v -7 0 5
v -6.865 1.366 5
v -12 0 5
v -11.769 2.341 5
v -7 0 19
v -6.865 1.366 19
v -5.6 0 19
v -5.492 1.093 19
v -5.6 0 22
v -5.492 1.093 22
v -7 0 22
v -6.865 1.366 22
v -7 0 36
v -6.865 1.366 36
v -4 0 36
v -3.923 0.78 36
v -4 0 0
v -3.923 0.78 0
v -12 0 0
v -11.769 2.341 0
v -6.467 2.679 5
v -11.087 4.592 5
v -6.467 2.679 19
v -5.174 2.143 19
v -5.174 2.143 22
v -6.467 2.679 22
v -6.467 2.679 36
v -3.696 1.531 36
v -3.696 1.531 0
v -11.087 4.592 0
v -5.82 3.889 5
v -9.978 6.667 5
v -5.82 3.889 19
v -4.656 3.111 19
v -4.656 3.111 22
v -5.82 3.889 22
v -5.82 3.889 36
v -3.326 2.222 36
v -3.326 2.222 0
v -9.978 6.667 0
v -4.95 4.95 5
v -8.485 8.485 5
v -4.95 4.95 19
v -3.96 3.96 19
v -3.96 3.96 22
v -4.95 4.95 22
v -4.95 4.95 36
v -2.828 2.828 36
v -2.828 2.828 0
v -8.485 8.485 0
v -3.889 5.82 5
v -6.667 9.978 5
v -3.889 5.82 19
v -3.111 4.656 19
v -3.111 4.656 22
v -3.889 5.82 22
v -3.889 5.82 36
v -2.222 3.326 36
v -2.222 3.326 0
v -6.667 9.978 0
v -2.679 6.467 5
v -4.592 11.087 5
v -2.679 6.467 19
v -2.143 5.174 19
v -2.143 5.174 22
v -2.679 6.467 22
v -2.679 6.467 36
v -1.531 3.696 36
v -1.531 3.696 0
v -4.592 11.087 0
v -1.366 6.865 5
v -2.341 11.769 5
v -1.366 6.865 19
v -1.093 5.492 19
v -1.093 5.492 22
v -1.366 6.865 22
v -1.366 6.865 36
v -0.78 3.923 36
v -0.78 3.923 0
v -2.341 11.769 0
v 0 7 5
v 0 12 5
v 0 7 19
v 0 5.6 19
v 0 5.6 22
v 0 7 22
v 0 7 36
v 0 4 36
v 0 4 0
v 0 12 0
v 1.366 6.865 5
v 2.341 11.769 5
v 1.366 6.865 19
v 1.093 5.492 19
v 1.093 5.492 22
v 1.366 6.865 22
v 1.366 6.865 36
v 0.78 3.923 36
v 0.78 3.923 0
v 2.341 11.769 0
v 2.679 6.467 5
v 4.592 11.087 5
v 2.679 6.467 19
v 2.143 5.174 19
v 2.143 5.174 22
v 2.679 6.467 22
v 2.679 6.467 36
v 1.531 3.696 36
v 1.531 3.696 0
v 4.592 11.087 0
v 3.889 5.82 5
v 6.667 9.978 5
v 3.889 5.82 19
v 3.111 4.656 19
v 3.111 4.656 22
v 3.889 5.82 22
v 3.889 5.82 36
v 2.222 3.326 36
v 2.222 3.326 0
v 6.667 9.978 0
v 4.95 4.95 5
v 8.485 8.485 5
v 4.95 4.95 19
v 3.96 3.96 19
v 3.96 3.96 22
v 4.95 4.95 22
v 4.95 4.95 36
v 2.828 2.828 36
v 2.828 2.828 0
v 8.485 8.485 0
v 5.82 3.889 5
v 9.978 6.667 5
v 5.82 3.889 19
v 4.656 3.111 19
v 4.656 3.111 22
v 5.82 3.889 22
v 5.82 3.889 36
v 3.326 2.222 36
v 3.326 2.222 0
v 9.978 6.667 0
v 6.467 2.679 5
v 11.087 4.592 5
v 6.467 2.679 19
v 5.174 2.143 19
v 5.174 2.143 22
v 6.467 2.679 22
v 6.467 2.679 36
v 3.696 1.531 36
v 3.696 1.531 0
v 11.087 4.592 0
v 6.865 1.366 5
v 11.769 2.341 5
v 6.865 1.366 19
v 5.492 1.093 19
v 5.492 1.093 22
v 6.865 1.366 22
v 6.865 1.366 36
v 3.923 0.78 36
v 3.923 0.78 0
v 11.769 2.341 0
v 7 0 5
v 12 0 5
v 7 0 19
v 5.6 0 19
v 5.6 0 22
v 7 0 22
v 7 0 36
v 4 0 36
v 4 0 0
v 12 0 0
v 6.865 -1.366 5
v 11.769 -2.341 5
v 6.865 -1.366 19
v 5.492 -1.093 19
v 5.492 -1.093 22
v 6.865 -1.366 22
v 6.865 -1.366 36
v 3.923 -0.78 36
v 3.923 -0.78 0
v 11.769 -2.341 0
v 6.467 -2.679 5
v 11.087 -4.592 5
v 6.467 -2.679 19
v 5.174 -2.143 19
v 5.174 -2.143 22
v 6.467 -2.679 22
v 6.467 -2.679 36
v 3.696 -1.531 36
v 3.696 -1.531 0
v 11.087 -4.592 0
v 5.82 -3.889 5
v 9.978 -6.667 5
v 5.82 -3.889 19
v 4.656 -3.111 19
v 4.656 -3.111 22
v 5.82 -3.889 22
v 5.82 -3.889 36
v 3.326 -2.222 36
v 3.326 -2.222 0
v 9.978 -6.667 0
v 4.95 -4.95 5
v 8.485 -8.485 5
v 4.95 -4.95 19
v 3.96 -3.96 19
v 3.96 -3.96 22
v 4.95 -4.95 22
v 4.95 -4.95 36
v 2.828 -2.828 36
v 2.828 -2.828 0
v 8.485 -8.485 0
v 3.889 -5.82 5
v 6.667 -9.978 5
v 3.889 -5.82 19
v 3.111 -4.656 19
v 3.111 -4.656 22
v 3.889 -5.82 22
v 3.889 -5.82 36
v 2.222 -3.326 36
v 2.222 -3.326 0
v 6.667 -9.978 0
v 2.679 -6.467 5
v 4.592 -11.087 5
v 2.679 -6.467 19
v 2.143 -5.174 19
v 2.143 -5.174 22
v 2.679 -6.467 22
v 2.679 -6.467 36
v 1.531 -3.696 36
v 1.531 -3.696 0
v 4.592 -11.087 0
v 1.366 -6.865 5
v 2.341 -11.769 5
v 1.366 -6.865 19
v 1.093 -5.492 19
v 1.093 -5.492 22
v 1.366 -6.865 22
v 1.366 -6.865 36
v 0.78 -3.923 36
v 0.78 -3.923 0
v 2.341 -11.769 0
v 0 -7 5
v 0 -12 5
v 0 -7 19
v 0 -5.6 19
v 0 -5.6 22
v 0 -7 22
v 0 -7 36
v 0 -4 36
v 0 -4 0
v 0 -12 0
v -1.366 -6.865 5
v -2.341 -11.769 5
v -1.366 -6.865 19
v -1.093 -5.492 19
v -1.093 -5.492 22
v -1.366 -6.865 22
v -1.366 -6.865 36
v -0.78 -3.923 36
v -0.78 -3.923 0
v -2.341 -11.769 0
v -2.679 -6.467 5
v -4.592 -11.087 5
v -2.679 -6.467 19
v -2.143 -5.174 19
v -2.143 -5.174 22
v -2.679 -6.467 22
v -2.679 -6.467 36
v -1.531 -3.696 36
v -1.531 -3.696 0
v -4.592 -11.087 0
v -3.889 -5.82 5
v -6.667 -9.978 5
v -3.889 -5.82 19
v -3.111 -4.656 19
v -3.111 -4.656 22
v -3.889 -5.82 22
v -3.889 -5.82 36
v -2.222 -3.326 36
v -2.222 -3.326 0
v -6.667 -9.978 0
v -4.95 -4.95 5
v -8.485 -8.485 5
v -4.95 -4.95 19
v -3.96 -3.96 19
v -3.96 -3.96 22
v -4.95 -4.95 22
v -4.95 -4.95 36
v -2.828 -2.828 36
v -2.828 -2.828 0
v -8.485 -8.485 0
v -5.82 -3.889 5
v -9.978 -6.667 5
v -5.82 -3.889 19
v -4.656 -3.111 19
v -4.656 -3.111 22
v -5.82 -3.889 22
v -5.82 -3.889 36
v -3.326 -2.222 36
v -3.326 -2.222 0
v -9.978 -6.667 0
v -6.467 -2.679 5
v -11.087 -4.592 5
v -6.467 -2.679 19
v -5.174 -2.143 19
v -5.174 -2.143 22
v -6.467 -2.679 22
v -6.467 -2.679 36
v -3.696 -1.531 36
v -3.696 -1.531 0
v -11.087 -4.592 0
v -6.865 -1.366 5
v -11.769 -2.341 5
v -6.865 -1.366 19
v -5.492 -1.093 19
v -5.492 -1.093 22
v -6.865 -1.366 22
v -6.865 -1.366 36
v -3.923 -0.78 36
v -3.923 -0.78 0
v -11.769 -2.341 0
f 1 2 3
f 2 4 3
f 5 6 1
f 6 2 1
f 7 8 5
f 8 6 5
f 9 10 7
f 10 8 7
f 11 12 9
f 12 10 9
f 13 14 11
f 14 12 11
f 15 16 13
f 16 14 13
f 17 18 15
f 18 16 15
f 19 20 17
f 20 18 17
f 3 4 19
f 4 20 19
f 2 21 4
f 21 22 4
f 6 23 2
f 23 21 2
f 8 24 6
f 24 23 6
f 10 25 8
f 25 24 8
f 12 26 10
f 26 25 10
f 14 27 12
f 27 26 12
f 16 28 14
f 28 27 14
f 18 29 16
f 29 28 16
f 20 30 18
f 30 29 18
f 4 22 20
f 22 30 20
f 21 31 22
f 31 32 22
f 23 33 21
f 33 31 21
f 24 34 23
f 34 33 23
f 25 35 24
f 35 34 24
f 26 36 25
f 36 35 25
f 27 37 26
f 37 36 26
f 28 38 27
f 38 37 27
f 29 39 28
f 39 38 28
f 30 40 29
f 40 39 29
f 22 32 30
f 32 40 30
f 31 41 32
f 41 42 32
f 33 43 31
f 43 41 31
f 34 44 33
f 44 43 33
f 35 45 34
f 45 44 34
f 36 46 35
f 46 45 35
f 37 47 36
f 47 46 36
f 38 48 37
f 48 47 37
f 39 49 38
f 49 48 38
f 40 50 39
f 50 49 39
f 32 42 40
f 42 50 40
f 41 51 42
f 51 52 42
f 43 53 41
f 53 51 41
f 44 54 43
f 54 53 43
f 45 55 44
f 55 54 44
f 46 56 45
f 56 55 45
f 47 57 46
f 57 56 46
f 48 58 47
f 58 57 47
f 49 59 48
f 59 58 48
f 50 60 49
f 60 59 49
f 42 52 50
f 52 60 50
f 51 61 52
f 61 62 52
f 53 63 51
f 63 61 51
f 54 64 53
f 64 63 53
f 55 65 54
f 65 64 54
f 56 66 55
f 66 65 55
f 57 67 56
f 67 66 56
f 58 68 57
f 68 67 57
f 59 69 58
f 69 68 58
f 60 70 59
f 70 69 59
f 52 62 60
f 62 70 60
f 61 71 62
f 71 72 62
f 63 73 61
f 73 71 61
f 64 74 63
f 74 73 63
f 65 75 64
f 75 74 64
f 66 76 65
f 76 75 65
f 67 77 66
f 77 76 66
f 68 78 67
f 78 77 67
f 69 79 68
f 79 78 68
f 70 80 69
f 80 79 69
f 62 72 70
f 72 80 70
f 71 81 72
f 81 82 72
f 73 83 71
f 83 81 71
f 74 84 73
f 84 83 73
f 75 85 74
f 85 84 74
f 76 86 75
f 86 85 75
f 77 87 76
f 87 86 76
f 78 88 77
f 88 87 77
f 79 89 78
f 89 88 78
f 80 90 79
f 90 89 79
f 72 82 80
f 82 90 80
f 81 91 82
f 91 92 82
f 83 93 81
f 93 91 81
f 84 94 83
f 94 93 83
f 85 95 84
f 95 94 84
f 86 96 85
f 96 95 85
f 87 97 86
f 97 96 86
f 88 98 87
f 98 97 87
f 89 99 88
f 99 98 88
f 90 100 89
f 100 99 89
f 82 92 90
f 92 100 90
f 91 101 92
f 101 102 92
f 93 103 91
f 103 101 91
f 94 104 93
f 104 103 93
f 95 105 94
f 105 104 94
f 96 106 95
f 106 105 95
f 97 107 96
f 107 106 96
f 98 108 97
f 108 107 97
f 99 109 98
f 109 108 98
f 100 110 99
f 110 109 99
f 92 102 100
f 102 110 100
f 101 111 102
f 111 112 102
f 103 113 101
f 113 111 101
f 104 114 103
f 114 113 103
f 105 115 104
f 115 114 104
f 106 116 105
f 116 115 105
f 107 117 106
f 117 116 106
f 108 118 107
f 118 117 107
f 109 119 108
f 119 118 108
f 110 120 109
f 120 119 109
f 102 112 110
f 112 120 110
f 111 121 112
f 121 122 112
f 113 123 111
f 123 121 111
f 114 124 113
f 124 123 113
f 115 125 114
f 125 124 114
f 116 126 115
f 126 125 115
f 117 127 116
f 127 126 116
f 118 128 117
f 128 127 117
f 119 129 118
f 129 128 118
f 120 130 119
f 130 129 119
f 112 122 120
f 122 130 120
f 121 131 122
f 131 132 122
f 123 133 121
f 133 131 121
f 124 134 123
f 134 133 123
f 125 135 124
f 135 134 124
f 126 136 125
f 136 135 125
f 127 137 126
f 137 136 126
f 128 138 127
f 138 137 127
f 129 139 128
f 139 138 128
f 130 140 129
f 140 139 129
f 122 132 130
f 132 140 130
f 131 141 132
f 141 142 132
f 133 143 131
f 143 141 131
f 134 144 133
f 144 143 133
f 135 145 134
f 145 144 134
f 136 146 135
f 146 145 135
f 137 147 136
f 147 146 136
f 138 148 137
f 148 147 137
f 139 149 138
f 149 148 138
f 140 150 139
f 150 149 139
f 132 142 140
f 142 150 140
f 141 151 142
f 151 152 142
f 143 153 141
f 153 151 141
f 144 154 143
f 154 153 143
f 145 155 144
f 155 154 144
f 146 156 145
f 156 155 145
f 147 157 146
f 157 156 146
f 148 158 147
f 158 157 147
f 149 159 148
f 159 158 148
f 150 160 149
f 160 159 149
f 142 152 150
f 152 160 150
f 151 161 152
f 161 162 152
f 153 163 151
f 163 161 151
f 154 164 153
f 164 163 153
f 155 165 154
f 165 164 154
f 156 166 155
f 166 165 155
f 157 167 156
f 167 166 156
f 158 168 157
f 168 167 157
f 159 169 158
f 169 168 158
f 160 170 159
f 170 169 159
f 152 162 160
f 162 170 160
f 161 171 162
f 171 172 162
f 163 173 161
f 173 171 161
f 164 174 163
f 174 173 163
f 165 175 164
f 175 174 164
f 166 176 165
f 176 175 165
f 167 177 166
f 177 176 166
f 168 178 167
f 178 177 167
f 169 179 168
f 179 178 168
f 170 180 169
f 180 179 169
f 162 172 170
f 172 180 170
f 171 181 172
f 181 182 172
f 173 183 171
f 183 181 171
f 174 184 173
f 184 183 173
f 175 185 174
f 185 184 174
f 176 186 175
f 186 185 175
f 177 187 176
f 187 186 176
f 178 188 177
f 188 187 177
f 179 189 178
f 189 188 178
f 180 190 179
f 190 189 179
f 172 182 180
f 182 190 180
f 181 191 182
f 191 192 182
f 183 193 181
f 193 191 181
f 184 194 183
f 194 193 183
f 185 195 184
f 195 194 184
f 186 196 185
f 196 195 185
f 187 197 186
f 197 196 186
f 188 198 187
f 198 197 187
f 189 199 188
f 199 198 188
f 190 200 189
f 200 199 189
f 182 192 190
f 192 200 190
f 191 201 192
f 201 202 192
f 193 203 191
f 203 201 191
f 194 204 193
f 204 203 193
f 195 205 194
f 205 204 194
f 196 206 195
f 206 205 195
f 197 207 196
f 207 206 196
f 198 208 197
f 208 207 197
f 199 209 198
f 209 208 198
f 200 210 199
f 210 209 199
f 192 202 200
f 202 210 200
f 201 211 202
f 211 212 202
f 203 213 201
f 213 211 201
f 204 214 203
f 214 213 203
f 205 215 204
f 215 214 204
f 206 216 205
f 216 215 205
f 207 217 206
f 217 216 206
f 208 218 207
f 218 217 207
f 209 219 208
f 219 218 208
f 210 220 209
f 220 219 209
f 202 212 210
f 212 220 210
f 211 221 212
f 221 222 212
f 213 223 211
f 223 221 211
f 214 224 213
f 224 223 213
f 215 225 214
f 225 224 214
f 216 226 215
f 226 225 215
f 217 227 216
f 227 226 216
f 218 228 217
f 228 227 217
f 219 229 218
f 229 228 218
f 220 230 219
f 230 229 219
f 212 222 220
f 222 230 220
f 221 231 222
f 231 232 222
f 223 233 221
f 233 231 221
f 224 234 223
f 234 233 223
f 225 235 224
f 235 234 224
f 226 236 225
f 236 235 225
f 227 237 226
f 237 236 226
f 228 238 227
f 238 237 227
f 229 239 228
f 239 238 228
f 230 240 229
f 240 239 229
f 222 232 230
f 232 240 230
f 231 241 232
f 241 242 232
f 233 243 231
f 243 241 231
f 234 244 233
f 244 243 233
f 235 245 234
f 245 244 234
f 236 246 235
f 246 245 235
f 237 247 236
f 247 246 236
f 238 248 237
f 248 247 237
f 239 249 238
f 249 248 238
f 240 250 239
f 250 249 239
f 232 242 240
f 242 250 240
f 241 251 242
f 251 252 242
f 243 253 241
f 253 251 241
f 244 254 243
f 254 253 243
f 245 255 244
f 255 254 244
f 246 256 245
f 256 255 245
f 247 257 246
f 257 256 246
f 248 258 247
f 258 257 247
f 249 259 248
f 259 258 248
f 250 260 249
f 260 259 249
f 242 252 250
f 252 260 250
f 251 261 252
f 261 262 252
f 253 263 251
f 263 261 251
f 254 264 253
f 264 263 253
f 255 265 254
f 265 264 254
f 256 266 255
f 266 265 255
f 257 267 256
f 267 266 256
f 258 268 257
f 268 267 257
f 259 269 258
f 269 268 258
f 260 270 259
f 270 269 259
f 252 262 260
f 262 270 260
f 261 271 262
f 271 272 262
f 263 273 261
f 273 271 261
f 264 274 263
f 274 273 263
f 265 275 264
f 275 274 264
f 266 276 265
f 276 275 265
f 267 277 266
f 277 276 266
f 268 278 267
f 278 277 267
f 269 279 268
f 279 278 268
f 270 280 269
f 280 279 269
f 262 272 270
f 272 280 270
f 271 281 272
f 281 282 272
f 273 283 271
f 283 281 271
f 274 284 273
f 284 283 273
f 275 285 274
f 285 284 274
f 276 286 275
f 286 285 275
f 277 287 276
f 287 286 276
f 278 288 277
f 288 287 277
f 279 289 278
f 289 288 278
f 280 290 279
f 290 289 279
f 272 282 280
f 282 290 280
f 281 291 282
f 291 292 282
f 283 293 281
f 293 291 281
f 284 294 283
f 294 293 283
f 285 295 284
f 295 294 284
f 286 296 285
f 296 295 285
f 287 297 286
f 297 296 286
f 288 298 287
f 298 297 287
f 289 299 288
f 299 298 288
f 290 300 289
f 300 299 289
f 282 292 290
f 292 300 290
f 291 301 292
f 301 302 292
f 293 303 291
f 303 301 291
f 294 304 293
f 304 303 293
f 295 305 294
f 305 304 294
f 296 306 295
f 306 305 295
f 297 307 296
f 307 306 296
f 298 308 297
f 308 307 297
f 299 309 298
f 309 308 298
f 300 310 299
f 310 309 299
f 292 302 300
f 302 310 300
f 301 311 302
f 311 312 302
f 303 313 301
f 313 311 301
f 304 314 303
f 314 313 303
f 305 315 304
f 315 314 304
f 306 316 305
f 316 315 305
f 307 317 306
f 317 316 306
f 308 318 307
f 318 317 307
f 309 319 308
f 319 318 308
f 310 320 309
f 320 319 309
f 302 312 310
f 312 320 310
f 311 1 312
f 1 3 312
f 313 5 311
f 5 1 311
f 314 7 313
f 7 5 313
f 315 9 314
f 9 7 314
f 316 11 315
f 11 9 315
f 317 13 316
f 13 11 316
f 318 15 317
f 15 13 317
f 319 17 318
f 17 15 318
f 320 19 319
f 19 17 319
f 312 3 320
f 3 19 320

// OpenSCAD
$fn = 32;

// ----------------------------------------------------------------------
// Grooved revolve: flanged, bore R4
// ----------------------------------------------------------------------

// --- parameters (mm) ---
bore_r = 4;               // bore radius
outer_r = 7;              // outer radius of the body
total_h = 36;             // overall height, Z
wall = 3;                 // radial wall thickness
groove_w = 3;             // groove width
groove_d = 1.4;           // groove depth
grooves = 1;              // number of outer grooves
flange_r = 12;            // flange radius
flange_h = 5;             // flange height

bbox_x = 2 * flange_r;  // full diameter
bore_d = 2 * bore_r;  // bore diameter
body_d = 2 * outer_r;  // body diameter
flange_d = 2 * flange_r;  // flange diameter
revolve_angle = 360;  // full turn around the Z axis

profile = [[4, 0], [7, 0], [12, 0], [12, 5], [7, 5], [7, 19], [5.6, 19], [5.6, 22], [7, 22], [7, 36], [4, 36]];  // primary outline, 11 points, counter clockwise

// --- the one profile operation ---
rotate_extrude(angle = revolve_angle) polygon(points = profile);
